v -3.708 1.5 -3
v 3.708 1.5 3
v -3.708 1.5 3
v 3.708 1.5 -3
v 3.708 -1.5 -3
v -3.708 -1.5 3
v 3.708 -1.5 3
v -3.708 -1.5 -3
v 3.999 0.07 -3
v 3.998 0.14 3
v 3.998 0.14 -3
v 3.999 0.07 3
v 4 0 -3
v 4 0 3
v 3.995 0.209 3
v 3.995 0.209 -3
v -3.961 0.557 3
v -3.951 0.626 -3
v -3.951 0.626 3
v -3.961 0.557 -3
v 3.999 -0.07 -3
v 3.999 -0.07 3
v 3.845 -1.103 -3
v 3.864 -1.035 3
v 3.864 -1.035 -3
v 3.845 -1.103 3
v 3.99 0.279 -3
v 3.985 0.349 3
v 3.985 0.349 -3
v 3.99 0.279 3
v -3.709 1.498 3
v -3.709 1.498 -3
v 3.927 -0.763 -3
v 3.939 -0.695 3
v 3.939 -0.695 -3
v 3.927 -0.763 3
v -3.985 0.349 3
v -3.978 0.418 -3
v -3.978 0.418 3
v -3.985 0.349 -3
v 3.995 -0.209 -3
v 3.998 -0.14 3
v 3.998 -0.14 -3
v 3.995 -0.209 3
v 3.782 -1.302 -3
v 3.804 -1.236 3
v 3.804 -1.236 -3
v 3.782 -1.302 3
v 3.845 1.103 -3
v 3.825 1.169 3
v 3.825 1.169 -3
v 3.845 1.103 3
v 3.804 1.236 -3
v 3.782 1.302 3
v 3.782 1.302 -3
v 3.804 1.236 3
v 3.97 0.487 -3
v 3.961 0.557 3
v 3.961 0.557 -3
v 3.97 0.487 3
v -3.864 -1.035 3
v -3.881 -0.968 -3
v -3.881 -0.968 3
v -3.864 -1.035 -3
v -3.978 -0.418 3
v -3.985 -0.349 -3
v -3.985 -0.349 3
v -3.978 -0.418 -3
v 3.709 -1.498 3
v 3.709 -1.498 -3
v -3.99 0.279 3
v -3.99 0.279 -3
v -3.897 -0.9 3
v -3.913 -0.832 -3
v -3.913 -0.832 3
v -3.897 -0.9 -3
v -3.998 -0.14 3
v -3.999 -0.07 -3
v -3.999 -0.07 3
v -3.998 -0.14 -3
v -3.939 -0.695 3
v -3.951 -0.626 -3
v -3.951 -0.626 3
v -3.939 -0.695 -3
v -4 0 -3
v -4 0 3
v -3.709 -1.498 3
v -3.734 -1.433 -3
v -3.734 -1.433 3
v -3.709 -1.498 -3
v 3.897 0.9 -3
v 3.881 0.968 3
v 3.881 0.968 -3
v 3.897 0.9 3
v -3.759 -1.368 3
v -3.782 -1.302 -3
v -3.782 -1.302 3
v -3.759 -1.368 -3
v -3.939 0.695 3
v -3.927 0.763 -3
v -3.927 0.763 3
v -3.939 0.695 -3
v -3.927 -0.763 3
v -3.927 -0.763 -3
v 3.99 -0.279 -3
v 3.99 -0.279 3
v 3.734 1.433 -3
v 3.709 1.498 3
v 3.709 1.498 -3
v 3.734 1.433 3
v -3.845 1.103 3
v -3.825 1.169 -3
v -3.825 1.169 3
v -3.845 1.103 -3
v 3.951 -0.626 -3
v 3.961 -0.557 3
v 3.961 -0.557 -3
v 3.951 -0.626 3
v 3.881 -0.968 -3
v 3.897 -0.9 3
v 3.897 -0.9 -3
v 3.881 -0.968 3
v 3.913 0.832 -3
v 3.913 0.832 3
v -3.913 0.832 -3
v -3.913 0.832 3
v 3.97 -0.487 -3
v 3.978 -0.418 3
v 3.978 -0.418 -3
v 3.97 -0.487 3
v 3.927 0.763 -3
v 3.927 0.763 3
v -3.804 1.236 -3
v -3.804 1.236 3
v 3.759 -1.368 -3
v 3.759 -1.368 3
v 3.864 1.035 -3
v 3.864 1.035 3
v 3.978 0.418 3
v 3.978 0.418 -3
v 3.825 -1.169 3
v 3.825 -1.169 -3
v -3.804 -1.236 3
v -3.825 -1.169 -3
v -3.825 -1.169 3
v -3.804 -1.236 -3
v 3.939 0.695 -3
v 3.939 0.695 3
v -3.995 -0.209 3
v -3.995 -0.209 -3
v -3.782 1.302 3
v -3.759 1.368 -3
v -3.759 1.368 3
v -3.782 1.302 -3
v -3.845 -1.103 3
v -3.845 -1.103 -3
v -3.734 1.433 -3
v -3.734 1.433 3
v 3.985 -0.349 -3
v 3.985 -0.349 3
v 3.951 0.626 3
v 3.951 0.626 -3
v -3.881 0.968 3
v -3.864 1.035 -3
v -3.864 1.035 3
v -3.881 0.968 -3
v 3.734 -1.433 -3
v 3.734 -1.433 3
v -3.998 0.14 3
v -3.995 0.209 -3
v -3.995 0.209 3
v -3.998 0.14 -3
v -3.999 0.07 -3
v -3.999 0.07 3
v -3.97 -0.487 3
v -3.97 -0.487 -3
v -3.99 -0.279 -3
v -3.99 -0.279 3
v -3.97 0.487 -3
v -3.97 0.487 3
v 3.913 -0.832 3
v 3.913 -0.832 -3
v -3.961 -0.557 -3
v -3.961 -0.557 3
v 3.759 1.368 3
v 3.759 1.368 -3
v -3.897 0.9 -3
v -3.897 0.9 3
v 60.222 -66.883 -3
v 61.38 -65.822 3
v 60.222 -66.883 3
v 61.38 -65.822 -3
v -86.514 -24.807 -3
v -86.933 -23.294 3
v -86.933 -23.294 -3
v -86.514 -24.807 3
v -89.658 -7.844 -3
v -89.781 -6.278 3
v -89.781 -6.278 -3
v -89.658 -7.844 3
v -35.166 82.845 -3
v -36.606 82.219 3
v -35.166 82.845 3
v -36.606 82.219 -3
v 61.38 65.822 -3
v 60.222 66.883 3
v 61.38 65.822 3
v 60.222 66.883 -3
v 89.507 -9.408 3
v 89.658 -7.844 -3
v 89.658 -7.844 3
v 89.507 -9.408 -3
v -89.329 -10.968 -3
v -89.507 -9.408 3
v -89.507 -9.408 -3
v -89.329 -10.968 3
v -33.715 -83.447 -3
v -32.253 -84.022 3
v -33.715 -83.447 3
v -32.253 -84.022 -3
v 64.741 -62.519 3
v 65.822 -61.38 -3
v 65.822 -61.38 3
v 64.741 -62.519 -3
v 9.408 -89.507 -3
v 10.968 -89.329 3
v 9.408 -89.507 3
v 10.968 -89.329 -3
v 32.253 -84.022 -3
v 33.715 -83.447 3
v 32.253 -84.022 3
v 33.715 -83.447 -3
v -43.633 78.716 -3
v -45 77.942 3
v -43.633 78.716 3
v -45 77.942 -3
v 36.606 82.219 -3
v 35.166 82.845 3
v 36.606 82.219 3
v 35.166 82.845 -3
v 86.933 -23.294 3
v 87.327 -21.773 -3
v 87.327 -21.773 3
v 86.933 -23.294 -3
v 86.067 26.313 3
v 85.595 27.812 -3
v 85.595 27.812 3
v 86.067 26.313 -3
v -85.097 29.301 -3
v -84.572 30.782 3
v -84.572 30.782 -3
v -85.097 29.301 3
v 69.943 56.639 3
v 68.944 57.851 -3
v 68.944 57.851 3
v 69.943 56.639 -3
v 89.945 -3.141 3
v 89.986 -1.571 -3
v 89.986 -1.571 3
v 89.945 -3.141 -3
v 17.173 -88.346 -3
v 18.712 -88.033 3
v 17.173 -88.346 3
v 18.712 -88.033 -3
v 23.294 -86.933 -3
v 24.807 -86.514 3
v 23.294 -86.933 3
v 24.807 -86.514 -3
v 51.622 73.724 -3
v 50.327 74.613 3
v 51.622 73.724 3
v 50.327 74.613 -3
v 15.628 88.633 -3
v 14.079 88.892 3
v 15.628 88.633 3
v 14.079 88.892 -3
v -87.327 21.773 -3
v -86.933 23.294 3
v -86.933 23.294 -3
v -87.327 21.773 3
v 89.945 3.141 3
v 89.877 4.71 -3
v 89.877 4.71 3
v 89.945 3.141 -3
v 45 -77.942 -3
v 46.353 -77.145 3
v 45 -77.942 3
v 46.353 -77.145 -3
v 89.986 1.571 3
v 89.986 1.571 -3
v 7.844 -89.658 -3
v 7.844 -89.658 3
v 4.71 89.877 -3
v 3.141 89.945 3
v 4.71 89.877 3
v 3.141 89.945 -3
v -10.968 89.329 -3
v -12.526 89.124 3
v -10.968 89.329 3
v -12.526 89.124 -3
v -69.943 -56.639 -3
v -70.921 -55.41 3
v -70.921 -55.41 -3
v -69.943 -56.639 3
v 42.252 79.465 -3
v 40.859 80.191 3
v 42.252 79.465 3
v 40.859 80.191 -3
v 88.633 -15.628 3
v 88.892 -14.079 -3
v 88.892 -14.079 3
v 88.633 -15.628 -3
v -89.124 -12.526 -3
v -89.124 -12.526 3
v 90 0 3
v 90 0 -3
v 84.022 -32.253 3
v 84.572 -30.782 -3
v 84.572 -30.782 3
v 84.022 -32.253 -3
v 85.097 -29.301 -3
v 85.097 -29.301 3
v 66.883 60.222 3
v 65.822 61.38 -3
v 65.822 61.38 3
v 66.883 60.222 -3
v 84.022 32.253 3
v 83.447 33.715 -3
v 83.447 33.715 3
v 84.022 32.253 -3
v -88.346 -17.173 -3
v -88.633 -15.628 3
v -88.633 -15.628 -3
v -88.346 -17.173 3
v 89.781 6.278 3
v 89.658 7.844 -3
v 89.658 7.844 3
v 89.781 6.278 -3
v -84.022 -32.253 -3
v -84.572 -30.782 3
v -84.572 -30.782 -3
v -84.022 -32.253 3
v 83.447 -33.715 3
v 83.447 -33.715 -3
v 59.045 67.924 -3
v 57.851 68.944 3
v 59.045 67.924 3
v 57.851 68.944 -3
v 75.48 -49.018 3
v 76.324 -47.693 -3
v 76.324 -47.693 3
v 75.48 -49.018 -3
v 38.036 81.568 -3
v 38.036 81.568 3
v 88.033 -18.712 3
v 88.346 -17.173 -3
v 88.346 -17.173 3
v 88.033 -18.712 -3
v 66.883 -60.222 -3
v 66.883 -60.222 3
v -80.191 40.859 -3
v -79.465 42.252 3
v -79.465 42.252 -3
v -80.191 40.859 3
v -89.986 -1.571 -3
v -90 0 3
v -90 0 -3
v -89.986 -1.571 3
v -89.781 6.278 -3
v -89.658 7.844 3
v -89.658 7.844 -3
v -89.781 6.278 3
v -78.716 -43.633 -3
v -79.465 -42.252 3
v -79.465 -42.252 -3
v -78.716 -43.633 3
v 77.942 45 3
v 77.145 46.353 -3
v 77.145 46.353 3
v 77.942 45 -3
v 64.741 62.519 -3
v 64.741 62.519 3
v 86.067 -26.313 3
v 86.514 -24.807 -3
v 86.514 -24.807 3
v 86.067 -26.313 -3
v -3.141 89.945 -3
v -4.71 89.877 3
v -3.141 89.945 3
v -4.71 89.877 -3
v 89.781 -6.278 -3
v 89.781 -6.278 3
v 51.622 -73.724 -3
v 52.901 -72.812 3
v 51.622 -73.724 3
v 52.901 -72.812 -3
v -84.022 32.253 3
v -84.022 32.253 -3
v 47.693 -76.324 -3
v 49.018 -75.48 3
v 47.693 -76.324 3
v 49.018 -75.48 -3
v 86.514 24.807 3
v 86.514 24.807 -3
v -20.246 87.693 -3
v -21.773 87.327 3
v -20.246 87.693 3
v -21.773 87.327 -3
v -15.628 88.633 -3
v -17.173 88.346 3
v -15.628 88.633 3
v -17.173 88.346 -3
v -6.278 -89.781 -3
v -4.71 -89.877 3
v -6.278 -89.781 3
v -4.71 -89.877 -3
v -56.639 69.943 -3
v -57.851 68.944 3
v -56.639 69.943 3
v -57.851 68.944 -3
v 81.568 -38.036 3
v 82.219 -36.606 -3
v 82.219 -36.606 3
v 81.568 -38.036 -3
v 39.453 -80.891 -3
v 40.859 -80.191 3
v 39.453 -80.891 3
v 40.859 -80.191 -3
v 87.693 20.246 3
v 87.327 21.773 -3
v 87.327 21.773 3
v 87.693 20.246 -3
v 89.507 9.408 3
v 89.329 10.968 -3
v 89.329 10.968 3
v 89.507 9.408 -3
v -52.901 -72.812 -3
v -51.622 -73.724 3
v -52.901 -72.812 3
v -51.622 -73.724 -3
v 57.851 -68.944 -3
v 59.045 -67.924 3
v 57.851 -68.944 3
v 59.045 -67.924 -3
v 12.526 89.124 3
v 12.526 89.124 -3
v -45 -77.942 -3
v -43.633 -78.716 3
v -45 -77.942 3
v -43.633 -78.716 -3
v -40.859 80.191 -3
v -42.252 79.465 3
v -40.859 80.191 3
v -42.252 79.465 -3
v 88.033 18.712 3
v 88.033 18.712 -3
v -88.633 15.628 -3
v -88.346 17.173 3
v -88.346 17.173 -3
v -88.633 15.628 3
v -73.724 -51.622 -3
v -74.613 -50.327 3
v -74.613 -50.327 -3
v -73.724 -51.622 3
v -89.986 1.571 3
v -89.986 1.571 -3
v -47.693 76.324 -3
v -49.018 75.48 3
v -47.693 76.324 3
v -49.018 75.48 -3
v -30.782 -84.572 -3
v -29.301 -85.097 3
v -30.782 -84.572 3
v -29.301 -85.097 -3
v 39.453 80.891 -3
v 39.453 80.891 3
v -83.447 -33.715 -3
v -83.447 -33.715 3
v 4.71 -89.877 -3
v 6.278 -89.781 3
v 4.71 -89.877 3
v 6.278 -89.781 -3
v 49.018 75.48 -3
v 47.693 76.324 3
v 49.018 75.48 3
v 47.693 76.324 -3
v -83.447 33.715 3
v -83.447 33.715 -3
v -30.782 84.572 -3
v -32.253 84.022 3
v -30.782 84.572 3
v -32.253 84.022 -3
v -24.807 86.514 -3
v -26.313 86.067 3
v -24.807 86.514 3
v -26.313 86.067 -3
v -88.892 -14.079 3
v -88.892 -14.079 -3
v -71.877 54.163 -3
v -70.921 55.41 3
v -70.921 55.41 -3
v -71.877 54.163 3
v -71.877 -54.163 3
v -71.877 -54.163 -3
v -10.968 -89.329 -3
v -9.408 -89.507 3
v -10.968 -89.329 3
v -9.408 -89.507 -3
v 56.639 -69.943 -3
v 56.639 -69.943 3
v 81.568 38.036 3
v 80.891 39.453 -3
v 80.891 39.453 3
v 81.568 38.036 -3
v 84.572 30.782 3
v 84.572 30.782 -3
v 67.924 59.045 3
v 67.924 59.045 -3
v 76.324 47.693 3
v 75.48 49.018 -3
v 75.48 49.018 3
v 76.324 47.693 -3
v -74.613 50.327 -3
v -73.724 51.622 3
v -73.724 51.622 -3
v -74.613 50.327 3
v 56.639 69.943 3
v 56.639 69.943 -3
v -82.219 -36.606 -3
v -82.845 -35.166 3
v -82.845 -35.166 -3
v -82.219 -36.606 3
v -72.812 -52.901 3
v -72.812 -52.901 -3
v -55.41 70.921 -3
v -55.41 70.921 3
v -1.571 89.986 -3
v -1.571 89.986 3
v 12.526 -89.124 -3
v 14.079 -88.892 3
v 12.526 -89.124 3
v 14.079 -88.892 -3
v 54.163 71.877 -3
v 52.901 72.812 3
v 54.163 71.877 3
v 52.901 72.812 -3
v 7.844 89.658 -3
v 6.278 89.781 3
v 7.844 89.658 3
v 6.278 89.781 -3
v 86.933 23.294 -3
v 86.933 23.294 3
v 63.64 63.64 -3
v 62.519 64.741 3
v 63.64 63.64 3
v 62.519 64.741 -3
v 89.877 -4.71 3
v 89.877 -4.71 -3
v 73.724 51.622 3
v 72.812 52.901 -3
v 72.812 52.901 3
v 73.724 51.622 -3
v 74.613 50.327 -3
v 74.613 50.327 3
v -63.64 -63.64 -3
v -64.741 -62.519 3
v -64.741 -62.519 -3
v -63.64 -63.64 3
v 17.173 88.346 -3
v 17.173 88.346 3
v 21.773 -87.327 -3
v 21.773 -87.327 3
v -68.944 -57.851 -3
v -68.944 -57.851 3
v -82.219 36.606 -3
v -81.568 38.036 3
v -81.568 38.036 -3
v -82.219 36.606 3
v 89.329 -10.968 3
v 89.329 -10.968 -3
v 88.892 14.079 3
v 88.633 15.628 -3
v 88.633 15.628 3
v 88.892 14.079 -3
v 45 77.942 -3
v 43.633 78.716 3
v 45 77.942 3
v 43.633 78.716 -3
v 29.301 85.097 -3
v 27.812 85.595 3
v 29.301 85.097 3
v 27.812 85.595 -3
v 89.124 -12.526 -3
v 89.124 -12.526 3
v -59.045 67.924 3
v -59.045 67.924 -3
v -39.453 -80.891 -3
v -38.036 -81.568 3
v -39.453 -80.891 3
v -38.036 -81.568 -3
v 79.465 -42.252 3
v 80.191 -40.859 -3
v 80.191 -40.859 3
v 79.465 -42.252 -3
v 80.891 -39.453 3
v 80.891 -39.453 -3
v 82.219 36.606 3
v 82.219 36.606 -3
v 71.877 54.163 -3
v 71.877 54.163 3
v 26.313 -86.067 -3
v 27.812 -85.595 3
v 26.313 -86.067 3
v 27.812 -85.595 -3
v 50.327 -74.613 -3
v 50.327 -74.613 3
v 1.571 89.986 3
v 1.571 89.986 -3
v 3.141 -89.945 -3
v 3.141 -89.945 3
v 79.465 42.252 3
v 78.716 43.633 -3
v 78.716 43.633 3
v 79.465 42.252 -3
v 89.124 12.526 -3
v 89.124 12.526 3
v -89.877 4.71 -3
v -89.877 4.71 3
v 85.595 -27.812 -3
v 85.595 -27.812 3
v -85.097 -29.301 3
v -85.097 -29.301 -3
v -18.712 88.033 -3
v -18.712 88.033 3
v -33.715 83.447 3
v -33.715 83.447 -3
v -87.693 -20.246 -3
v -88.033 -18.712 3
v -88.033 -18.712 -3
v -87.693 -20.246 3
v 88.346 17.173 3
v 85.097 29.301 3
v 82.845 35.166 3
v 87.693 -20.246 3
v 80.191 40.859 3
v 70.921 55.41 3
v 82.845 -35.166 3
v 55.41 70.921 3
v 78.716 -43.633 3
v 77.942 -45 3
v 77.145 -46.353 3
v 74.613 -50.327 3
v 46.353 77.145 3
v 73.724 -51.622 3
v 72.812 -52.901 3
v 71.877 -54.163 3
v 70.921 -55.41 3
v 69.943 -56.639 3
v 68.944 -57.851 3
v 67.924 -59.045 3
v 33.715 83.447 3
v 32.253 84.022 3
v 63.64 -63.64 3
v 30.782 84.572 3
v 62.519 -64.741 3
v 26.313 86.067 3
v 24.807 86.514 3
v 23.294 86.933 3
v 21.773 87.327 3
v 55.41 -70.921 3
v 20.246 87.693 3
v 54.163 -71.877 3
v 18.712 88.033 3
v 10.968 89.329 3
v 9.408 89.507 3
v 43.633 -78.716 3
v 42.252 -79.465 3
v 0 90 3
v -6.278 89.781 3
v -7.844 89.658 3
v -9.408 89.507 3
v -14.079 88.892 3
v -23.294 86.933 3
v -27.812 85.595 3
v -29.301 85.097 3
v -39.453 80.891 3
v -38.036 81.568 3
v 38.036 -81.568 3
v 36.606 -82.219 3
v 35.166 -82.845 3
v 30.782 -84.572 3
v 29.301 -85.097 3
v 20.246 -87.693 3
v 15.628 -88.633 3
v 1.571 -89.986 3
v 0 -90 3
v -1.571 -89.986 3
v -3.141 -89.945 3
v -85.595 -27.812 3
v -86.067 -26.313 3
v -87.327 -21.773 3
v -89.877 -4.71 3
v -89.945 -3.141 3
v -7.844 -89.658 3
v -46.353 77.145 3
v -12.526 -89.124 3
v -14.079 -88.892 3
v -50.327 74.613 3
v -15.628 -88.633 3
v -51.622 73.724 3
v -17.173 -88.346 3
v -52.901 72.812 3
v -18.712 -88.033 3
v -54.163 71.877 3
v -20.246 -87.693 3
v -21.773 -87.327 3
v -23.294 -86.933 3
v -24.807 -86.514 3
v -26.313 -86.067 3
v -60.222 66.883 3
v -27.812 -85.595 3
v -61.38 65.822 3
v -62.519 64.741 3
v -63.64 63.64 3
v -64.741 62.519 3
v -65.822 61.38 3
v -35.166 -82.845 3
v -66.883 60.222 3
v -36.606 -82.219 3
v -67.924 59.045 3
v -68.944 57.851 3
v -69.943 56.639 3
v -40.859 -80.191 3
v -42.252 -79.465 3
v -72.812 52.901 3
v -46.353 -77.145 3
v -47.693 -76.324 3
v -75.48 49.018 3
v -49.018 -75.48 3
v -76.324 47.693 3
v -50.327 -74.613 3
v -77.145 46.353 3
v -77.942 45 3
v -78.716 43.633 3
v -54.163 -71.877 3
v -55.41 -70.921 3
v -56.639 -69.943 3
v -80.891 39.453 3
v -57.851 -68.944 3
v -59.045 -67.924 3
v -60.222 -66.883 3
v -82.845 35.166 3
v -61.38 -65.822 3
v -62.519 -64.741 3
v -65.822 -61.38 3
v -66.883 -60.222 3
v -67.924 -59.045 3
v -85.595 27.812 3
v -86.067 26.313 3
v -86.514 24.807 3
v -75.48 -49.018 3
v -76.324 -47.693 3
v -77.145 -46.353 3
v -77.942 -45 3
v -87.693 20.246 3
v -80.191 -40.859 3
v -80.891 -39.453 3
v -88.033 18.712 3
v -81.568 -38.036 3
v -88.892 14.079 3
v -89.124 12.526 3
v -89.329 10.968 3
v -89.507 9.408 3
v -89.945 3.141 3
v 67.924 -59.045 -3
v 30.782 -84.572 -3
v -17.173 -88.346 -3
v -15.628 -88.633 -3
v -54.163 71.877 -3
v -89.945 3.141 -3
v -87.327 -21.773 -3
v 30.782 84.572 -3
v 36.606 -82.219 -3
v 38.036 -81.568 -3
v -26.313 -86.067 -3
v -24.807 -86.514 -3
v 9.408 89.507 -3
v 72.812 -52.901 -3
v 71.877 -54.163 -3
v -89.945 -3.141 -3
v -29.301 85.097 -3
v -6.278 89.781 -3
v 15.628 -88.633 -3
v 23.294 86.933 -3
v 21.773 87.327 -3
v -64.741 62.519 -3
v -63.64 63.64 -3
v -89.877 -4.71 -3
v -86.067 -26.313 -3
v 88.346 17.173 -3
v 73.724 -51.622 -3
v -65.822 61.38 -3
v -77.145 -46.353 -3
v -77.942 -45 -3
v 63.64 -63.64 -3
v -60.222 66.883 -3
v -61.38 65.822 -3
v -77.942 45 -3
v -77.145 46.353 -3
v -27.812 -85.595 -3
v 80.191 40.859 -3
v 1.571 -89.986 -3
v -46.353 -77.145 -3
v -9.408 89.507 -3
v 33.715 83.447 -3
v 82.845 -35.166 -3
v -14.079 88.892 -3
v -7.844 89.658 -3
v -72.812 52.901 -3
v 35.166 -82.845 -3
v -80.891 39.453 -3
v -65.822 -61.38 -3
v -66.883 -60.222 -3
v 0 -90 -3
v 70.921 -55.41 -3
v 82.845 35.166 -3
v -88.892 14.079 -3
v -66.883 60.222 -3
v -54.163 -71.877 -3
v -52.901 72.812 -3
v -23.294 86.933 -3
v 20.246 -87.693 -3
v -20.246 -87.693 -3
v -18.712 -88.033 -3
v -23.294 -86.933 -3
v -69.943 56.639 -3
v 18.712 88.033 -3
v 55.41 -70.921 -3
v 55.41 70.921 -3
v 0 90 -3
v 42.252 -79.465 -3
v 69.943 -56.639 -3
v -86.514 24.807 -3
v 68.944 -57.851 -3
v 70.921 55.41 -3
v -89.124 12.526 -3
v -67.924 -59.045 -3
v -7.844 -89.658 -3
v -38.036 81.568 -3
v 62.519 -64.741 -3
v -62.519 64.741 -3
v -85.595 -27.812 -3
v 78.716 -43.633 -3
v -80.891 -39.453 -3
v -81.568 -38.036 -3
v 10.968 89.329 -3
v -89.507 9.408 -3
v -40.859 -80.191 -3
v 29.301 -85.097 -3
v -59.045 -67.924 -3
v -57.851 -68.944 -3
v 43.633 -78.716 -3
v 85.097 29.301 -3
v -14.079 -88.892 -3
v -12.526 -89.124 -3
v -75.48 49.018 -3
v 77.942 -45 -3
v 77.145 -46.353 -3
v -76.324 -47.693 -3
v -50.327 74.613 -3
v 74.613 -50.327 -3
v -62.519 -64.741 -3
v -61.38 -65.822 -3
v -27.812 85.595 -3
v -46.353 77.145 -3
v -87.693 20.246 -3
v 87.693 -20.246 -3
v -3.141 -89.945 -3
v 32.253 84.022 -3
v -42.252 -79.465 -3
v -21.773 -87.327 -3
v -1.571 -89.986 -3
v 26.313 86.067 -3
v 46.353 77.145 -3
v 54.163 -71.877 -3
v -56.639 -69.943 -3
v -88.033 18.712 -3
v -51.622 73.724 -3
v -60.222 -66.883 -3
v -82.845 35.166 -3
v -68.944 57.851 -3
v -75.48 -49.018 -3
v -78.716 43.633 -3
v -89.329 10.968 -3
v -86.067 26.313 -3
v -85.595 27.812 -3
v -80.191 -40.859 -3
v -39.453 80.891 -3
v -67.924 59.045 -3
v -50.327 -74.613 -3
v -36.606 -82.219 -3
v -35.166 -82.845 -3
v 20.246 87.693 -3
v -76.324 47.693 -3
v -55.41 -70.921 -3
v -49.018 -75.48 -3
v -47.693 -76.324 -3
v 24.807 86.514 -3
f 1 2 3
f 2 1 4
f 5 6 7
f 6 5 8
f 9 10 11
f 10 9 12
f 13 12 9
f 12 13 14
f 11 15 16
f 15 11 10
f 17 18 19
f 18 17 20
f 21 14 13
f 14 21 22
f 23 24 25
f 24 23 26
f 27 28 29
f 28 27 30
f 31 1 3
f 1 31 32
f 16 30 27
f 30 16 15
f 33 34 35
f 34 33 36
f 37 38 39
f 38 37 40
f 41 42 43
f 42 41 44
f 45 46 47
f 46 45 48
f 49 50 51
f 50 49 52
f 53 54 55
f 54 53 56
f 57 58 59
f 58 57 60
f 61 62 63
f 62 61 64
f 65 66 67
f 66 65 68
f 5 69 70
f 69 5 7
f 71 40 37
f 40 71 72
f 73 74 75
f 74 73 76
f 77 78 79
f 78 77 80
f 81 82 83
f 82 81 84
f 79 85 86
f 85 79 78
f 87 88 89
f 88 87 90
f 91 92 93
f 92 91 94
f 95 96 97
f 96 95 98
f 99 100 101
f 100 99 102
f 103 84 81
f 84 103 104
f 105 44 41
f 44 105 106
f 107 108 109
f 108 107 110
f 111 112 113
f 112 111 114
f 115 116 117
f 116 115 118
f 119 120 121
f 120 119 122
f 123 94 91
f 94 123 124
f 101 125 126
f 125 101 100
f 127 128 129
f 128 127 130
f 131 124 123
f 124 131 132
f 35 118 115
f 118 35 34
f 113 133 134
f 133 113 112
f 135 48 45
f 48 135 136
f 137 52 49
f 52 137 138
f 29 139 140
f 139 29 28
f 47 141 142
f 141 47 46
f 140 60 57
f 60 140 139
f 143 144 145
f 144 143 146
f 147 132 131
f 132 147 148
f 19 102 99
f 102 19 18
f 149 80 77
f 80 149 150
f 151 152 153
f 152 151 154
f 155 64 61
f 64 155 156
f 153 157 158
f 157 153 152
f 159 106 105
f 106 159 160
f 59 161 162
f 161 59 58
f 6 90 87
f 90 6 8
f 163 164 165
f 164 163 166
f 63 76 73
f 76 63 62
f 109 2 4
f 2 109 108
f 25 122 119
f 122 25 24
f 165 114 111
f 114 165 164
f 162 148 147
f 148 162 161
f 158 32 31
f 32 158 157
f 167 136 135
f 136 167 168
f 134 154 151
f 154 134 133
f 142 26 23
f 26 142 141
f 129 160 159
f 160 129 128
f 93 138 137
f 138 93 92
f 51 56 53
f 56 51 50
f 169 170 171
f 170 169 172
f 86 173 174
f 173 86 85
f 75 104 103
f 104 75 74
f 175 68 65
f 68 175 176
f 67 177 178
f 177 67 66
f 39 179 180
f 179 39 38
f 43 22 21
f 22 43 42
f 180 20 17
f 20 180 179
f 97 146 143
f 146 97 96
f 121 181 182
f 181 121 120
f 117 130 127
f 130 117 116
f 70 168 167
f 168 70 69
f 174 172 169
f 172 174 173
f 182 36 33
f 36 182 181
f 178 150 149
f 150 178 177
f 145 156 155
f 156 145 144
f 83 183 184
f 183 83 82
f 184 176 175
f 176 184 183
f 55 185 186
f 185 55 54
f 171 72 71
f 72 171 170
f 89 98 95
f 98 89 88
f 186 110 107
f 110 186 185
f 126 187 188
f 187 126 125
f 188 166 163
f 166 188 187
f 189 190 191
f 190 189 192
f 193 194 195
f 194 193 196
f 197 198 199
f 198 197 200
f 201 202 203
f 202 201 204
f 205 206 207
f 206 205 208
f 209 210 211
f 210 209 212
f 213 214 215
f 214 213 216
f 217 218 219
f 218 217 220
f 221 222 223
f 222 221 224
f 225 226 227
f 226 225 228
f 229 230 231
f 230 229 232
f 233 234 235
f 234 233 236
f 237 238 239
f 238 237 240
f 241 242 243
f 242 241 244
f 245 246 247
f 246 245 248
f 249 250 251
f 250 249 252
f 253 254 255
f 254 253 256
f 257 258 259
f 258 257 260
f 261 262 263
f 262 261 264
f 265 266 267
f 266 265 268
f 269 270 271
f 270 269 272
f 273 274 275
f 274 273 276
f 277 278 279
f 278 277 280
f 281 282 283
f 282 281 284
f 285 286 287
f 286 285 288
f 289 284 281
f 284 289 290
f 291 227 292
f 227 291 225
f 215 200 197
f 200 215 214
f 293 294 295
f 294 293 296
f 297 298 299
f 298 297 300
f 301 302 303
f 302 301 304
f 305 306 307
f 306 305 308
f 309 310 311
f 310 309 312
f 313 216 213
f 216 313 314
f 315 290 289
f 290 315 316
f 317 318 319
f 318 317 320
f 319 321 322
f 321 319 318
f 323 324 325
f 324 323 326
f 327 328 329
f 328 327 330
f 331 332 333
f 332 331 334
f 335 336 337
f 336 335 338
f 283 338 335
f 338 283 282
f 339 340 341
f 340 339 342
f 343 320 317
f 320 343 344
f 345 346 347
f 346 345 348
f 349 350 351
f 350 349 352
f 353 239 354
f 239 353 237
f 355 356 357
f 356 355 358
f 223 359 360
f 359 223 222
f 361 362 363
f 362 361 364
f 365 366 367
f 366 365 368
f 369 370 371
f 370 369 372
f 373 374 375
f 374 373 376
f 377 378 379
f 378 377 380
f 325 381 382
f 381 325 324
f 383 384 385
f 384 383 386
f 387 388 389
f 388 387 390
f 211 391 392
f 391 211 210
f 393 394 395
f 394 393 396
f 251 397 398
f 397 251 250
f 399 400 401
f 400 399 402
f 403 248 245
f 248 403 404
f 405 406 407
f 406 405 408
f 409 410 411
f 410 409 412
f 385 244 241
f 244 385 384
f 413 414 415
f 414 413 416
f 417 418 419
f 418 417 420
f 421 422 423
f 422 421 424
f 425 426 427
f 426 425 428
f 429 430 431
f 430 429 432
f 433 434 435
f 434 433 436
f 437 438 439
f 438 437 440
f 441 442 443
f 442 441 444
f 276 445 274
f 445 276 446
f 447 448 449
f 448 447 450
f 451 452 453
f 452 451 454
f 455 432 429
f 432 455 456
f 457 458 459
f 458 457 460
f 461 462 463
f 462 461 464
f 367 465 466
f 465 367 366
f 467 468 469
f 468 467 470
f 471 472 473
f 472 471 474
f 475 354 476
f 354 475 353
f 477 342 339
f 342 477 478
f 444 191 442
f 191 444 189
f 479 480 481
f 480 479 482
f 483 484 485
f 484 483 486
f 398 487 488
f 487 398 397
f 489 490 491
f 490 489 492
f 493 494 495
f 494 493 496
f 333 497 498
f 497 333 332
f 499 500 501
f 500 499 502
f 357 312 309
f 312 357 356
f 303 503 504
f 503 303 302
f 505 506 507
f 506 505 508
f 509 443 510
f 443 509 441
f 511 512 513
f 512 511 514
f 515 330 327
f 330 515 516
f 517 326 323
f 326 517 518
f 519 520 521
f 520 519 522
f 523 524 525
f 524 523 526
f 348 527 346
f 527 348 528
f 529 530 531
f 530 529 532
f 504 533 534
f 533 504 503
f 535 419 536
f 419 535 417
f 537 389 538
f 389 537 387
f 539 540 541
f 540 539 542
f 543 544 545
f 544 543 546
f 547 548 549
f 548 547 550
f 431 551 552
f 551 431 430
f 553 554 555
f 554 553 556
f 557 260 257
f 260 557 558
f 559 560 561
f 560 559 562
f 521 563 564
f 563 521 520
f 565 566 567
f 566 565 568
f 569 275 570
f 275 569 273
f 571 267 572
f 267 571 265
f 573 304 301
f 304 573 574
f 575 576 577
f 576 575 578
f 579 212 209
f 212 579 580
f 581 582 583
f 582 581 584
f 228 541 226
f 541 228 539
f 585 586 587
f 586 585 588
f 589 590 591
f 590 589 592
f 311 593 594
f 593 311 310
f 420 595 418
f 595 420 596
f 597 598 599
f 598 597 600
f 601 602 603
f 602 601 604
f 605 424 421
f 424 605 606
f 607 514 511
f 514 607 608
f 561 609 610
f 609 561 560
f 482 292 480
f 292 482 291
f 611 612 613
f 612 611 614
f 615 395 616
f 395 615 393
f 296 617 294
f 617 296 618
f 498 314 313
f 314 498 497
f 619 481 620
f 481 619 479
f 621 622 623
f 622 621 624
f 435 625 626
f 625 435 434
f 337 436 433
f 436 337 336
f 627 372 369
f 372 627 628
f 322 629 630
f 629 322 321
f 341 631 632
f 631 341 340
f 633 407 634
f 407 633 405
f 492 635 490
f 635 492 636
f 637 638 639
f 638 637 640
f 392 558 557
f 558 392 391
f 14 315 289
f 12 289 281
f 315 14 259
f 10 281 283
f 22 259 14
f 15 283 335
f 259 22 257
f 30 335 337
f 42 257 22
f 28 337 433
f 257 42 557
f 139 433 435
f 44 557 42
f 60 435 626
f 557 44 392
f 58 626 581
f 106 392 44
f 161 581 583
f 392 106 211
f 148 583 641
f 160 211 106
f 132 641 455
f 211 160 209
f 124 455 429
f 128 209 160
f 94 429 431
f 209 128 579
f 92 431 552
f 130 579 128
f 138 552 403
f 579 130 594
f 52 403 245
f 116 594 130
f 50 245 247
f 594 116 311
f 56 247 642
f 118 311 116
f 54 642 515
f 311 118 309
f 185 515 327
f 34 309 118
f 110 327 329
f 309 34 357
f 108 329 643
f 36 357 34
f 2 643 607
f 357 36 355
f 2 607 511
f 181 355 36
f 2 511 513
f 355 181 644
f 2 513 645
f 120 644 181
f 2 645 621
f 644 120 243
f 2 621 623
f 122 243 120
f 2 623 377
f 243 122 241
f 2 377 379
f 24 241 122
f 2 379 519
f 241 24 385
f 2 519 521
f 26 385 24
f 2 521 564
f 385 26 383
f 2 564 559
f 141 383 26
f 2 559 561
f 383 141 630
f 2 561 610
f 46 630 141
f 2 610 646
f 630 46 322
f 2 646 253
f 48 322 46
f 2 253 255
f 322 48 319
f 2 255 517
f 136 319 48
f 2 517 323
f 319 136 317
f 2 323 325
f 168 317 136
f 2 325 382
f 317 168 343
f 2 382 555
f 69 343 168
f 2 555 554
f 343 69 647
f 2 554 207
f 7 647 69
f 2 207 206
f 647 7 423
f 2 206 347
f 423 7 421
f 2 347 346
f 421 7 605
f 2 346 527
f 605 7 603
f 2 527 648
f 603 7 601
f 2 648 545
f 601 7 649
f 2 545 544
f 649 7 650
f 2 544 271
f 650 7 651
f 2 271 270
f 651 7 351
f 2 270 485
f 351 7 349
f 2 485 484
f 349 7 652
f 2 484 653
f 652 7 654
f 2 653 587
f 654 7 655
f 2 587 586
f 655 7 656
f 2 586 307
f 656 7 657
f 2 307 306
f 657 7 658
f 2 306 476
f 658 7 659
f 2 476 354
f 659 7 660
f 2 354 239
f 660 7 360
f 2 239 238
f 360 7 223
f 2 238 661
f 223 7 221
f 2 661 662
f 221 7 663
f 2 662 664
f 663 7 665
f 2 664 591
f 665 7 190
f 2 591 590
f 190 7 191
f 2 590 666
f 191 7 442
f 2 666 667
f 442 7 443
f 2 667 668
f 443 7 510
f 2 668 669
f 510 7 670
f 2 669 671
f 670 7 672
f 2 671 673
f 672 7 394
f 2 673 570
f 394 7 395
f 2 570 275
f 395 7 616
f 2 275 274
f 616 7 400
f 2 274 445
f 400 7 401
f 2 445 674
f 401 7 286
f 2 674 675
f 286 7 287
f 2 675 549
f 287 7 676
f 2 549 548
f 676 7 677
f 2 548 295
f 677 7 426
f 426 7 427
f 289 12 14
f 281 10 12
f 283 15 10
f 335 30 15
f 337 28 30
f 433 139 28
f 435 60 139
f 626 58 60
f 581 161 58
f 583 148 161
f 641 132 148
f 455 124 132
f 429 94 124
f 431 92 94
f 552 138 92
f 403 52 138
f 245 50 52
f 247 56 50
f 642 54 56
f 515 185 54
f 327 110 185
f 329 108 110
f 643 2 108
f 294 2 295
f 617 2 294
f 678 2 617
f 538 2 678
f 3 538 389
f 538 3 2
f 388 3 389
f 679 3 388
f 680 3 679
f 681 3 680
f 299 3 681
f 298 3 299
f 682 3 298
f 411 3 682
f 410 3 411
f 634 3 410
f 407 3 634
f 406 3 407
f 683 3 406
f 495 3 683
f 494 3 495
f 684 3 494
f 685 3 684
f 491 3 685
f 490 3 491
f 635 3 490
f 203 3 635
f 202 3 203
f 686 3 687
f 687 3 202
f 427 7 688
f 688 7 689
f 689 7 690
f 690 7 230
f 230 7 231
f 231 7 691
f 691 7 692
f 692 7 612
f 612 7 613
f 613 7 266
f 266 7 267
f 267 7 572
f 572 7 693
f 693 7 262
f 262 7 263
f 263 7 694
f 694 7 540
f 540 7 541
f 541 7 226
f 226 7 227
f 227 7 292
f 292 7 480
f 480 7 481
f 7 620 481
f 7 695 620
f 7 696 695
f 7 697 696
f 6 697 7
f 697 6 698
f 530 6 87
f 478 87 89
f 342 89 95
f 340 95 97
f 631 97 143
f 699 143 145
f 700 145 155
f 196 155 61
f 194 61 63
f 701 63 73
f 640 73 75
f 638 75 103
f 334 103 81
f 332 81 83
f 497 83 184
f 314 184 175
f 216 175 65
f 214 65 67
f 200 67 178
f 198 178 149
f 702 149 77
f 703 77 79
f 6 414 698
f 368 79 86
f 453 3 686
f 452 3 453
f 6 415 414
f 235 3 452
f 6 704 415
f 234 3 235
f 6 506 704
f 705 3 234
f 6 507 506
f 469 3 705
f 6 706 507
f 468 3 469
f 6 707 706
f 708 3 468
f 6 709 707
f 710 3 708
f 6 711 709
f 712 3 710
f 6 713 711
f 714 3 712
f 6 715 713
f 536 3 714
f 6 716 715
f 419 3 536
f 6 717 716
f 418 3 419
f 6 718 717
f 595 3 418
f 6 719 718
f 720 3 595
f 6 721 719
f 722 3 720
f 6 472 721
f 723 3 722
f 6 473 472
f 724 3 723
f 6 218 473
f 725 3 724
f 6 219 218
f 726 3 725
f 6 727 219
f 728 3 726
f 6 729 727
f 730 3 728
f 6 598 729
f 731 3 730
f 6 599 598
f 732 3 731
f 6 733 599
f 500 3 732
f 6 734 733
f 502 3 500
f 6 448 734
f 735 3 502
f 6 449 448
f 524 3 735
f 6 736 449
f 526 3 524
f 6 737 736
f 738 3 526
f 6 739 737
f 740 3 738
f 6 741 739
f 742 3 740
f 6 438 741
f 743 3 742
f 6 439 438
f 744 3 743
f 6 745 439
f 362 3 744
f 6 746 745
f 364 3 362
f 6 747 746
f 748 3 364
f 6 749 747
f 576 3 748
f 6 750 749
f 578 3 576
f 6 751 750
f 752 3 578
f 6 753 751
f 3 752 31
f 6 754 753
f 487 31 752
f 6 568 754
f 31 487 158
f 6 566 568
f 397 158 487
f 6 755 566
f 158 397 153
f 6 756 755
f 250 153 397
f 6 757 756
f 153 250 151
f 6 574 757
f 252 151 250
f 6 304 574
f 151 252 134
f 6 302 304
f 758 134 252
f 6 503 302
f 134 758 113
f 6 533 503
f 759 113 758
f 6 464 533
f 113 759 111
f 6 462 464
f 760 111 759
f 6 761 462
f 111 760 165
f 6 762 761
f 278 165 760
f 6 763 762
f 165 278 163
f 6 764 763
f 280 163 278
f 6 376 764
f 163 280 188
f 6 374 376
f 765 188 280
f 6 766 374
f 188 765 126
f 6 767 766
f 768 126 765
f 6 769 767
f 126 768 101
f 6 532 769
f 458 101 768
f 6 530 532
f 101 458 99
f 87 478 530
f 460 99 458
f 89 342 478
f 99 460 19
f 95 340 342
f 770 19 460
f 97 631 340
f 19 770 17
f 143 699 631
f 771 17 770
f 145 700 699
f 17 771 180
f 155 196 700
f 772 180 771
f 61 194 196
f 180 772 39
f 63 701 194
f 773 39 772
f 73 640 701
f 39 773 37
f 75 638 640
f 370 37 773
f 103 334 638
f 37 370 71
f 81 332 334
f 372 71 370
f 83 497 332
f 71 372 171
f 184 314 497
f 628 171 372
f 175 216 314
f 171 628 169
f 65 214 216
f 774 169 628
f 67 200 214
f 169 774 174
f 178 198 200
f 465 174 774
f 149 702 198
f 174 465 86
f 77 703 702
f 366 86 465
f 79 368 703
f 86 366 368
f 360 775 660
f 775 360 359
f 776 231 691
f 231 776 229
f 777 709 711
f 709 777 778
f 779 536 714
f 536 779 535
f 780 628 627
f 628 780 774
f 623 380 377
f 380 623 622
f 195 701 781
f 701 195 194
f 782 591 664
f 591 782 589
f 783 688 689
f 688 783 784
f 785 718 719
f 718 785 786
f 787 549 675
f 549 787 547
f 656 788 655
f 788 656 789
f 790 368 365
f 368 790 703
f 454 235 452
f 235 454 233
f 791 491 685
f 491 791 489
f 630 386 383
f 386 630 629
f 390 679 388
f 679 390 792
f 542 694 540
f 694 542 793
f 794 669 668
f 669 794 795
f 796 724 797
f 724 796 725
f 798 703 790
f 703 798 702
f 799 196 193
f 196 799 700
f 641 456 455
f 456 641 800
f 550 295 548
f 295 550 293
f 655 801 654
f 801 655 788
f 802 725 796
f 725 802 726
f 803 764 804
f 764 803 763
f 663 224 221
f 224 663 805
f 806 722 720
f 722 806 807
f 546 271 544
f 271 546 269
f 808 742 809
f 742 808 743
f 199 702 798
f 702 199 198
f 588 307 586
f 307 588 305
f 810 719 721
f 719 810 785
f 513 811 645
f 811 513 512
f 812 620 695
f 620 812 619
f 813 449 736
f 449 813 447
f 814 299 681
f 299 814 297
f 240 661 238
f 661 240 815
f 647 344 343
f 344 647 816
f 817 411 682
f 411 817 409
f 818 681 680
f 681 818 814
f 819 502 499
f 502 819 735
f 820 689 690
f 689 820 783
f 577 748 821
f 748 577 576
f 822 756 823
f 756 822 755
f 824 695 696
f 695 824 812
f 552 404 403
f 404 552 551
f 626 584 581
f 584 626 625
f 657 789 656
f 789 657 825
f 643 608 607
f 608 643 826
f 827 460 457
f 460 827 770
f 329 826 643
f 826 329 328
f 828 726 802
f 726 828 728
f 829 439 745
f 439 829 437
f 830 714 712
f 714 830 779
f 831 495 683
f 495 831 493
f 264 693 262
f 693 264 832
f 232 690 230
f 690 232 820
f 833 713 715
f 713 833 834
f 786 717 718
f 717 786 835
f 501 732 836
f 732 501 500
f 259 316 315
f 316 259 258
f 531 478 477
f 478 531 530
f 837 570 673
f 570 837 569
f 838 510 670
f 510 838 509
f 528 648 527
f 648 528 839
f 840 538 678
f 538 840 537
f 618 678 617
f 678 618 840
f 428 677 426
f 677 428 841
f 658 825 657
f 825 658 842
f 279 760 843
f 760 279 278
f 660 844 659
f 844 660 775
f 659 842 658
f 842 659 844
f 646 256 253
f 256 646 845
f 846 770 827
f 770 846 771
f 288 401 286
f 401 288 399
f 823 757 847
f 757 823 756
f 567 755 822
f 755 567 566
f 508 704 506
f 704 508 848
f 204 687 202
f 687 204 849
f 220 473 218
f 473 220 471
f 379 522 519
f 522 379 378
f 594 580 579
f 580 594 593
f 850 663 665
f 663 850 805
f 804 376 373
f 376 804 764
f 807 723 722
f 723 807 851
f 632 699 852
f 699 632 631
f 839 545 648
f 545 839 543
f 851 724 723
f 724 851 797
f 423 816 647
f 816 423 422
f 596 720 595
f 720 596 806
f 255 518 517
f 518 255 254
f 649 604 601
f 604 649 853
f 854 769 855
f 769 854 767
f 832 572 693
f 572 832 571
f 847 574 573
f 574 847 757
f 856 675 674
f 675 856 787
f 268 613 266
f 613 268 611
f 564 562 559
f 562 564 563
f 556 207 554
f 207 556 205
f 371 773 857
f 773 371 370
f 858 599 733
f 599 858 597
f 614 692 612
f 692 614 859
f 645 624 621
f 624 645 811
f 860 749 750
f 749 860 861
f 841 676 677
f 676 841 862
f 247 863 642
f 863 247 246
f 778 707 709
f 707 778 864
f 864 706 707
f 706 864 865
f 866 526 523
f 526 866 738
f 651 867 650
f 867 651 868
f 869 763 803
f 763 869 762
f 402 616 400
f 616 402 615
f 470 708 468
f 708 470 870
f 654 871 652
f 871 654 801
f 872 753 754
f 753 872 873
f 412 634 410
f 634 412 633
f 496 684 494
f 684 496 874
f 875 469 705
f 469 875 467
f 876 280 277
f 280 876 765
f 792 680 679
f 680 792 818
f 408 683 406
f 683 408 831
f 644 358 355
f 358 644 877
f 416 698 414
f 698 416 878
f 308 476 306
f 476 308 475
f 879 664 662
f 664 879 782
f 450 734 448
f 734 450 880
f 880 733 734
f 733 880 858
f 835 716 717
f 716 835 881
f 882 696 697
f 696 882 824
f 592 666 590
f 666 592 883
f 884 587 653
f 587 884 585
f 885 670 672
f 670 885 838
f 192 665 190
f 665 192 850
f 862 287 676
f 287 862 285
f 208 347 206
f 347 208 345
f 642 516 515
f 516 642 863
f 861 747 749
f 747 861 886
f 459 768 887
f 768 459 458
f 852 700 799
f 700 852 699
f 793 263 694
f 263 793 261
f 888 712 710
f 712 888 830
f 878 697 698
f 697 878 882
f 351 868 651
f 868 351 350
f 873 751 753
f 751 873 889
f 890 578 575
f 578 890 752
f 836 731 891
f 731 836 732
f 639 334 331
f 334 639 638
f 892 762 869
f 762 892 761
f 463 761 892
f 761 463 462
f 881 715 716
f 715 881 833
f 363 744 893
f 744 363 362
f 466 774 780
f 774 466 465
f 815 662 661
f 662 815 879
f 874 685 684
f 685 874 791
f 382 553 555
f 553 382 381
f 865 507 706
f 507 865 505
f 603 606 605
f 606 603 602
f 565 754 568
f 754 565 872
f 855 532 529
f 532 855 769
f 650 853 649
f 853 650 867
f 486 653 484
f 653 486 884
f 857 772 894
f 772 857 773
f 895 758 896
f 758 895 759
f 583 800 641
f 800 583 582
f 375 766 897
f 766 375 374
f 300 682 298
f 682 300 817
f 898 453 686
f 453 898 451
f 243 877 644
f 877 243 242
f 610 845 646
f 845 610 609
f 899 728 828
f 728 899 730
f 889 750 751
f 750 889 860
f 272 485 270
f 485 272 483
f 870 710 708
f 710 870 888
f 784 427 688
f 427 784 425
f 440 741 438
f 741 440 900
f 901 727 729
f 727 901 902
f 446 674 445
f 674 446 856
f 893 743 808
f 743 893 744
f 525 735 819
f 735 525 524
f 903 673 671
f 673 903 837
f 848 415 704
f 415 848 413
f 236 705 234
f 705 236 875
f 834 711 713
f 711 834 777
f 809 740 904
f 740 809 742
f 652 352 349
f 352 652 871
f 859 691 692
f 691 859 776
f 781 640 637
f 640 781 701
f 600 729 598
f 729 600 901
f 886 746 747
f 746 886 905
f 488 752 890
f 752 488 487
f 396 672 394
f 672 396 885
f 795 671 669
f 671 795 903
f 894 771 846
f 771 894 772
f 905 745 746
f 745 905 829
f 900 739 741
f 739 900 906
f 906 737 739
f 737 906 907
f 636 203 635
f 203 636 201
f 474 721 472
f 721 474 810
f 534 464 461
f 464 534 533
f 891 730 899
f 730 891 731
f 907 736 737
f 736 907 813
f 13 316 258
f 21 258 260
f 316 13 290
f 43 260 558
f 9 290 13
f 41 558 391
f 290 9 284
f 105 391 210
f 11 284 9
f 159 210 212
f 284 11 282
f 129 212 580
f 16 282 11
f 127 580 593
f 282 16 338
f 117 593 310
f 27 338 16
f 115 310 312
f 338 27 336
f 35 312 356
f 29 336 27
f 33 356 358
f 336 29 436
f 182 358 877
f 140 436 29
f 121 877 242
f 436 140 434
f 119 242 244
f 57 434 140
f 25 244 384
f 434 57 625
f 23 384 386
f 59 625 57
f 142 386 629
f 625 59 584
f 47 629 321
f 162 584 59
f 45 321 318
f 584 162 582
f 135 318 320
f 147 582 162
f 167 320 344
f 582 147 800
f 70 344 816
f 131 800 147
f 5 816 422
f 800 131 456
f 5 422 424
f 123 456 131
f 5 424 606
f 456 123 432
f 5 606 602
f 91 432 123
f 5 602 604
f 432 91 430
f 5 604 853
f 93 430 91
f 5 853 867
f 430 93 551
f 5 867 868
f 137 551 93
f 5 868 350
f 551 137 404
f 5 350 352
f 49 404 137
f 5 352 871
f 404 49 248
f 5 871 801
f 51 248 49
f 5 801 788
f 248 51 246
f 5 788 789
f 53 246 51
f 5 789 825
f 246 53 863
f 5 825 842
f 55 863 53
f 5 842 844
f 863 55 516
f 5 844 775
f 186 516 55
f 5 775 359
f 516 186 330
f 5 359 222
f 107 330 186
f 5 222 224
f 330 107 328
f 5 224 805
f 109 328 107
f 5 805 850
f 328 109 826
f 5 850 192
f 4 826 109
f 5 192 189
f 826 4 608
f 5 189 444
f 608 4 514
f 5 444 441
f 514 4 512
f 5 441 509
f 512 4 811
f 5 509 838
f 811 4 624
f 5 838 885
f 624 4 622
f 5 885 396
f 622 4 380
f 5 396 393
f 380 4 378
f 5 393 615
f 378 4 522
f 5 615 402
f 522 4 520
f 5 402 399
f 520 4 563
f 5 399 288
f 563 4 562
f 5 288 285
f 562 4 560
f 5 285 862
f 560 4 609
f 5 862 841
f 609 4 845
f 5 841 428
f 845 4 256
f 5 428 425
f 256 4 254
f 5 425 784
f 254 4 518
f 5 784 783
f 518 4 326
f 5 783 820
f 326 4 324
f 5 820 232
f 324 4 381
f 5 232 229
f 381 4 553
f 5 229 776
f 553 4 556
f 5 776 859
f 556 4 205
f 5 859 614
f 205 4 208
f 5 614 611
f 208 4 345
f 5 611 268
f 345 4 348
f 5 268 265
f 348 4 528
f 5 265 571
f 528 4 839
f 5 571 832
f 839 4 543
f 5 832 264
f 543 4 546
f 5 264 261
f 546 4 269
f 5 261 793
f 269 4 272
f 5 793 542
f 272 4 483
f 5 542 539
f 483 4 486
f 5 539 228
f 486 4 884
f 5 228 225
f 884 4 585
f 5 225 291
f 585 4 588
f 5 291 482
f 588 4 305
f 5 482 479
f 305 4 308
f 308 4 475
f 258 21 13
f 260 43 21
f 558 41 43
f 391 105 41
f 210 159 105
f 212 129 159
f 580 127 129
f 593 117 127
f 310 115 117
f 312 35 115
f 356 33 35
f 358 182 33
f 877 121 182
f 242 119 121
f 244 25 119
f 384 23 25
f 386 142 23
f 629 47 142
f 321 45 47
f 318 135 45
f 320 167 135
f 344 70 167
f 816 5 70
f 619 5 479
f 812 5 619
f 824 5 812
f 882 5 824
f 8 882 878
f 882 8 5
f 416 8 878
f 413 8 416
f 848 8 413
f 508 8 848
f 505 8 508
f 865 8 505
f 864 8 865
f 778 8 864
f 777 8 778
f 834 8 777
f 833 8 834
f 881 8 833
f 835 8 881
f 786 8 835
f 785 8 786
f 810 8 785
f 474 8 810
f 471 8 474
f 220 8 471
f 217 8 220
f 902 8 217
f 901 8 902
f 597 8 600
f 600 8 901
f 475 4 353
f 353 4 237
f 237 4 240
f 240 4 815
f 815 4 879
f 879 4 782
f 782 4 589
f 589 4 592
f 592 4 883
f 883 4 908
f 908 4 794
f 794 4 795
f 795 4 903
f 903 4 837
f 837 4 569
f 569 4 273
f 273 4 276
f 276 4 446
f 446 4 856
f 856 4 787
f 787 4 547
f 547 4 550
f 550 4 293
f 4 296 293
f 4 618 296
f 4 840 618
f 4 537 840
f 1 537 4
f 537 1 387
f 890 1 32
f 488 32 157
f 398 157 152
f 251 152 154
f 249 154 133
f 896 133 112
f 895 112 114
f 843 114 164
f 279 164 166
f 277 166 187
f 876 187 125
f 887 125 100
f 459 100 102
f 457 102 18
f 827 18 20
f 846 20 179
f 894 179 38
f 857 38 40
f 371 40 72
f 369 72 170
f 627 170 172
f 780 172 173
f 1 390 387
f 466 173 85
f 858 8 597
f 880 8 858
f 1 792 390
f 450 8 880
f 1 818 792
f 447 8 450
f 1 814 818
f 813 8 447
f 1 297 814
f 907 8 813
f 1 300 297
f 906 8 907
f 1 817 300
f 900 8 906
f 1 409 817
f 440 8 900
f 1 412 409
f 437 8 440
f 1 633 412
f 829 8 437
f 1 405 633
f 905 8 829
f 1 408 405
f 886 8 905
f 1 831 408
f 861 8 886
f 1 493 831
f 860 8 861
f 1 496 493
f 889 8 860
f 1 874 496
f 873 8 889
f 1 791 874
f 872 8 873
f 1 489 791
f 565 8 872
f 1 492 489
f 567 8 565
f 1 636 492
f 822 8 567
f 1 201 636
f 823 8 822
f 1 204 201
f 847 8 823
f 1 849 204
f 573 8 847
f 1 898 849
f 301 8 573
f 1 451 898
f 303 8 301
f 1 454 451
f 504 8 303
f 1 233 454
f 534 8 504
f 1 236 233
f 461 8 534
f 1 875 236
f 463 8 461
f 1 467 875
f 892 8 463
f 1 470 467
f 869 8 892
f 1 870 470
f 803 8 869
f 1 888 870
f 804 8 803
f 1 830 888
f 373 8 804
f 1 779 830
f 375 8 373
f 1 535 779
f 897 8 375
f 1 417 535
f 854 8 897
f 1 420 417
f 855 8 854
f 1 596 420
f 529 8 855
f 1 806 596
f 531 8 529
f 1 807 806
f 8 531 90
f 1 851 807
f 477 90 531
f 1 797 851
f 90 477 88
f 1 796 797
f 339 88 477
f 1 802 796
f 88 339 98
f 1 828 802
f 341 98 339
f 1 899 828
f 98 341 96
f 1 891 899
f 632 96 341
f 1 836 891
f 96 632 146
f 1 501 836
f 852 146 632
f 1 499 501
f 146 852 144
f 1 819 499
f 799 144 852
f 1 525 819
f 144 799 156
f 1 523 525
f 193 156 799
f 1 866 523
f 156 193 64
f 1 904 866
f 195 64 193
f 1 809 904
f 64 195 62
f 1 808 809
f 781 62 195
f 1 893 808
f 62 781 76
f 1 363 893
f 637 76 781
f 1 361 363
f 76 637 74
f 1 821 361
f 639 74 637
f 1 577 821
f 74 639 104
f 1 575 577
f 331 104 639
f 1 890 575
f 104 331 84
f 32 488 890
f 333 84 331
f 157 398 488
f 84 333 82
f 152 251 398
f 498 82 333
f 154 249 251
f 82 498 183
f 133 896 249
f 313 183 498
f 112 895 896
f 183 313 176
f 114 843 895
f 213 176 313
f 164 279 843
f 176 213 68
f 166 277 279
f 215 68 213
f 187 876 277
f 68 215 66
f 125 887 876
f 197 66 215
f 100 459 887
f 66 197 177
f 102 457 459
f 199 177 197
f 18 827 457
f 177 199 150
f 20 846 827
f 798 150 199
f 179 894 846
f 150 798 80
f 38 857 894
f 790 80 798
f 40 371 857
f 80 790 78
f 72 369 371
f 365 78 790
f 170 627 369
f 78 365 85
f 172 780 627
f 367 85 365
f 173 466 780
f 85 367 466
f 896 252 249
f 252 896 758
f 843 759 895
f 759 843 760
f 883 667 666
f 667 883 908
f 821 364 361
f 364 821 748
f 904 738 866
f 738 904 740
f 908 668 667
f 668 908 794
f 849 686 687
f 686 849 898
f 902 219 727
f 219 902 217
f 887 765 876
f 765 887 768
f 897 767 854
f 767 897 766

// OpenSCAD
$fn=360;

difference() {
    cylinder(6,90,90,true);
    
    difference() {
        cylinder(99,4,4,true);
        union() {
            translate([0, 11.5, 5]) {
               cube([20,20,20], true); 
            }

            translate([0, -11.5, 5]) {
               cube([20,20,20], true); 
            }
        }
    }

    //union() {
        
      //  translate([0,0,-4]) {
        //    cylinder(22,16,16,true);
        //}   
   // }
    
}
